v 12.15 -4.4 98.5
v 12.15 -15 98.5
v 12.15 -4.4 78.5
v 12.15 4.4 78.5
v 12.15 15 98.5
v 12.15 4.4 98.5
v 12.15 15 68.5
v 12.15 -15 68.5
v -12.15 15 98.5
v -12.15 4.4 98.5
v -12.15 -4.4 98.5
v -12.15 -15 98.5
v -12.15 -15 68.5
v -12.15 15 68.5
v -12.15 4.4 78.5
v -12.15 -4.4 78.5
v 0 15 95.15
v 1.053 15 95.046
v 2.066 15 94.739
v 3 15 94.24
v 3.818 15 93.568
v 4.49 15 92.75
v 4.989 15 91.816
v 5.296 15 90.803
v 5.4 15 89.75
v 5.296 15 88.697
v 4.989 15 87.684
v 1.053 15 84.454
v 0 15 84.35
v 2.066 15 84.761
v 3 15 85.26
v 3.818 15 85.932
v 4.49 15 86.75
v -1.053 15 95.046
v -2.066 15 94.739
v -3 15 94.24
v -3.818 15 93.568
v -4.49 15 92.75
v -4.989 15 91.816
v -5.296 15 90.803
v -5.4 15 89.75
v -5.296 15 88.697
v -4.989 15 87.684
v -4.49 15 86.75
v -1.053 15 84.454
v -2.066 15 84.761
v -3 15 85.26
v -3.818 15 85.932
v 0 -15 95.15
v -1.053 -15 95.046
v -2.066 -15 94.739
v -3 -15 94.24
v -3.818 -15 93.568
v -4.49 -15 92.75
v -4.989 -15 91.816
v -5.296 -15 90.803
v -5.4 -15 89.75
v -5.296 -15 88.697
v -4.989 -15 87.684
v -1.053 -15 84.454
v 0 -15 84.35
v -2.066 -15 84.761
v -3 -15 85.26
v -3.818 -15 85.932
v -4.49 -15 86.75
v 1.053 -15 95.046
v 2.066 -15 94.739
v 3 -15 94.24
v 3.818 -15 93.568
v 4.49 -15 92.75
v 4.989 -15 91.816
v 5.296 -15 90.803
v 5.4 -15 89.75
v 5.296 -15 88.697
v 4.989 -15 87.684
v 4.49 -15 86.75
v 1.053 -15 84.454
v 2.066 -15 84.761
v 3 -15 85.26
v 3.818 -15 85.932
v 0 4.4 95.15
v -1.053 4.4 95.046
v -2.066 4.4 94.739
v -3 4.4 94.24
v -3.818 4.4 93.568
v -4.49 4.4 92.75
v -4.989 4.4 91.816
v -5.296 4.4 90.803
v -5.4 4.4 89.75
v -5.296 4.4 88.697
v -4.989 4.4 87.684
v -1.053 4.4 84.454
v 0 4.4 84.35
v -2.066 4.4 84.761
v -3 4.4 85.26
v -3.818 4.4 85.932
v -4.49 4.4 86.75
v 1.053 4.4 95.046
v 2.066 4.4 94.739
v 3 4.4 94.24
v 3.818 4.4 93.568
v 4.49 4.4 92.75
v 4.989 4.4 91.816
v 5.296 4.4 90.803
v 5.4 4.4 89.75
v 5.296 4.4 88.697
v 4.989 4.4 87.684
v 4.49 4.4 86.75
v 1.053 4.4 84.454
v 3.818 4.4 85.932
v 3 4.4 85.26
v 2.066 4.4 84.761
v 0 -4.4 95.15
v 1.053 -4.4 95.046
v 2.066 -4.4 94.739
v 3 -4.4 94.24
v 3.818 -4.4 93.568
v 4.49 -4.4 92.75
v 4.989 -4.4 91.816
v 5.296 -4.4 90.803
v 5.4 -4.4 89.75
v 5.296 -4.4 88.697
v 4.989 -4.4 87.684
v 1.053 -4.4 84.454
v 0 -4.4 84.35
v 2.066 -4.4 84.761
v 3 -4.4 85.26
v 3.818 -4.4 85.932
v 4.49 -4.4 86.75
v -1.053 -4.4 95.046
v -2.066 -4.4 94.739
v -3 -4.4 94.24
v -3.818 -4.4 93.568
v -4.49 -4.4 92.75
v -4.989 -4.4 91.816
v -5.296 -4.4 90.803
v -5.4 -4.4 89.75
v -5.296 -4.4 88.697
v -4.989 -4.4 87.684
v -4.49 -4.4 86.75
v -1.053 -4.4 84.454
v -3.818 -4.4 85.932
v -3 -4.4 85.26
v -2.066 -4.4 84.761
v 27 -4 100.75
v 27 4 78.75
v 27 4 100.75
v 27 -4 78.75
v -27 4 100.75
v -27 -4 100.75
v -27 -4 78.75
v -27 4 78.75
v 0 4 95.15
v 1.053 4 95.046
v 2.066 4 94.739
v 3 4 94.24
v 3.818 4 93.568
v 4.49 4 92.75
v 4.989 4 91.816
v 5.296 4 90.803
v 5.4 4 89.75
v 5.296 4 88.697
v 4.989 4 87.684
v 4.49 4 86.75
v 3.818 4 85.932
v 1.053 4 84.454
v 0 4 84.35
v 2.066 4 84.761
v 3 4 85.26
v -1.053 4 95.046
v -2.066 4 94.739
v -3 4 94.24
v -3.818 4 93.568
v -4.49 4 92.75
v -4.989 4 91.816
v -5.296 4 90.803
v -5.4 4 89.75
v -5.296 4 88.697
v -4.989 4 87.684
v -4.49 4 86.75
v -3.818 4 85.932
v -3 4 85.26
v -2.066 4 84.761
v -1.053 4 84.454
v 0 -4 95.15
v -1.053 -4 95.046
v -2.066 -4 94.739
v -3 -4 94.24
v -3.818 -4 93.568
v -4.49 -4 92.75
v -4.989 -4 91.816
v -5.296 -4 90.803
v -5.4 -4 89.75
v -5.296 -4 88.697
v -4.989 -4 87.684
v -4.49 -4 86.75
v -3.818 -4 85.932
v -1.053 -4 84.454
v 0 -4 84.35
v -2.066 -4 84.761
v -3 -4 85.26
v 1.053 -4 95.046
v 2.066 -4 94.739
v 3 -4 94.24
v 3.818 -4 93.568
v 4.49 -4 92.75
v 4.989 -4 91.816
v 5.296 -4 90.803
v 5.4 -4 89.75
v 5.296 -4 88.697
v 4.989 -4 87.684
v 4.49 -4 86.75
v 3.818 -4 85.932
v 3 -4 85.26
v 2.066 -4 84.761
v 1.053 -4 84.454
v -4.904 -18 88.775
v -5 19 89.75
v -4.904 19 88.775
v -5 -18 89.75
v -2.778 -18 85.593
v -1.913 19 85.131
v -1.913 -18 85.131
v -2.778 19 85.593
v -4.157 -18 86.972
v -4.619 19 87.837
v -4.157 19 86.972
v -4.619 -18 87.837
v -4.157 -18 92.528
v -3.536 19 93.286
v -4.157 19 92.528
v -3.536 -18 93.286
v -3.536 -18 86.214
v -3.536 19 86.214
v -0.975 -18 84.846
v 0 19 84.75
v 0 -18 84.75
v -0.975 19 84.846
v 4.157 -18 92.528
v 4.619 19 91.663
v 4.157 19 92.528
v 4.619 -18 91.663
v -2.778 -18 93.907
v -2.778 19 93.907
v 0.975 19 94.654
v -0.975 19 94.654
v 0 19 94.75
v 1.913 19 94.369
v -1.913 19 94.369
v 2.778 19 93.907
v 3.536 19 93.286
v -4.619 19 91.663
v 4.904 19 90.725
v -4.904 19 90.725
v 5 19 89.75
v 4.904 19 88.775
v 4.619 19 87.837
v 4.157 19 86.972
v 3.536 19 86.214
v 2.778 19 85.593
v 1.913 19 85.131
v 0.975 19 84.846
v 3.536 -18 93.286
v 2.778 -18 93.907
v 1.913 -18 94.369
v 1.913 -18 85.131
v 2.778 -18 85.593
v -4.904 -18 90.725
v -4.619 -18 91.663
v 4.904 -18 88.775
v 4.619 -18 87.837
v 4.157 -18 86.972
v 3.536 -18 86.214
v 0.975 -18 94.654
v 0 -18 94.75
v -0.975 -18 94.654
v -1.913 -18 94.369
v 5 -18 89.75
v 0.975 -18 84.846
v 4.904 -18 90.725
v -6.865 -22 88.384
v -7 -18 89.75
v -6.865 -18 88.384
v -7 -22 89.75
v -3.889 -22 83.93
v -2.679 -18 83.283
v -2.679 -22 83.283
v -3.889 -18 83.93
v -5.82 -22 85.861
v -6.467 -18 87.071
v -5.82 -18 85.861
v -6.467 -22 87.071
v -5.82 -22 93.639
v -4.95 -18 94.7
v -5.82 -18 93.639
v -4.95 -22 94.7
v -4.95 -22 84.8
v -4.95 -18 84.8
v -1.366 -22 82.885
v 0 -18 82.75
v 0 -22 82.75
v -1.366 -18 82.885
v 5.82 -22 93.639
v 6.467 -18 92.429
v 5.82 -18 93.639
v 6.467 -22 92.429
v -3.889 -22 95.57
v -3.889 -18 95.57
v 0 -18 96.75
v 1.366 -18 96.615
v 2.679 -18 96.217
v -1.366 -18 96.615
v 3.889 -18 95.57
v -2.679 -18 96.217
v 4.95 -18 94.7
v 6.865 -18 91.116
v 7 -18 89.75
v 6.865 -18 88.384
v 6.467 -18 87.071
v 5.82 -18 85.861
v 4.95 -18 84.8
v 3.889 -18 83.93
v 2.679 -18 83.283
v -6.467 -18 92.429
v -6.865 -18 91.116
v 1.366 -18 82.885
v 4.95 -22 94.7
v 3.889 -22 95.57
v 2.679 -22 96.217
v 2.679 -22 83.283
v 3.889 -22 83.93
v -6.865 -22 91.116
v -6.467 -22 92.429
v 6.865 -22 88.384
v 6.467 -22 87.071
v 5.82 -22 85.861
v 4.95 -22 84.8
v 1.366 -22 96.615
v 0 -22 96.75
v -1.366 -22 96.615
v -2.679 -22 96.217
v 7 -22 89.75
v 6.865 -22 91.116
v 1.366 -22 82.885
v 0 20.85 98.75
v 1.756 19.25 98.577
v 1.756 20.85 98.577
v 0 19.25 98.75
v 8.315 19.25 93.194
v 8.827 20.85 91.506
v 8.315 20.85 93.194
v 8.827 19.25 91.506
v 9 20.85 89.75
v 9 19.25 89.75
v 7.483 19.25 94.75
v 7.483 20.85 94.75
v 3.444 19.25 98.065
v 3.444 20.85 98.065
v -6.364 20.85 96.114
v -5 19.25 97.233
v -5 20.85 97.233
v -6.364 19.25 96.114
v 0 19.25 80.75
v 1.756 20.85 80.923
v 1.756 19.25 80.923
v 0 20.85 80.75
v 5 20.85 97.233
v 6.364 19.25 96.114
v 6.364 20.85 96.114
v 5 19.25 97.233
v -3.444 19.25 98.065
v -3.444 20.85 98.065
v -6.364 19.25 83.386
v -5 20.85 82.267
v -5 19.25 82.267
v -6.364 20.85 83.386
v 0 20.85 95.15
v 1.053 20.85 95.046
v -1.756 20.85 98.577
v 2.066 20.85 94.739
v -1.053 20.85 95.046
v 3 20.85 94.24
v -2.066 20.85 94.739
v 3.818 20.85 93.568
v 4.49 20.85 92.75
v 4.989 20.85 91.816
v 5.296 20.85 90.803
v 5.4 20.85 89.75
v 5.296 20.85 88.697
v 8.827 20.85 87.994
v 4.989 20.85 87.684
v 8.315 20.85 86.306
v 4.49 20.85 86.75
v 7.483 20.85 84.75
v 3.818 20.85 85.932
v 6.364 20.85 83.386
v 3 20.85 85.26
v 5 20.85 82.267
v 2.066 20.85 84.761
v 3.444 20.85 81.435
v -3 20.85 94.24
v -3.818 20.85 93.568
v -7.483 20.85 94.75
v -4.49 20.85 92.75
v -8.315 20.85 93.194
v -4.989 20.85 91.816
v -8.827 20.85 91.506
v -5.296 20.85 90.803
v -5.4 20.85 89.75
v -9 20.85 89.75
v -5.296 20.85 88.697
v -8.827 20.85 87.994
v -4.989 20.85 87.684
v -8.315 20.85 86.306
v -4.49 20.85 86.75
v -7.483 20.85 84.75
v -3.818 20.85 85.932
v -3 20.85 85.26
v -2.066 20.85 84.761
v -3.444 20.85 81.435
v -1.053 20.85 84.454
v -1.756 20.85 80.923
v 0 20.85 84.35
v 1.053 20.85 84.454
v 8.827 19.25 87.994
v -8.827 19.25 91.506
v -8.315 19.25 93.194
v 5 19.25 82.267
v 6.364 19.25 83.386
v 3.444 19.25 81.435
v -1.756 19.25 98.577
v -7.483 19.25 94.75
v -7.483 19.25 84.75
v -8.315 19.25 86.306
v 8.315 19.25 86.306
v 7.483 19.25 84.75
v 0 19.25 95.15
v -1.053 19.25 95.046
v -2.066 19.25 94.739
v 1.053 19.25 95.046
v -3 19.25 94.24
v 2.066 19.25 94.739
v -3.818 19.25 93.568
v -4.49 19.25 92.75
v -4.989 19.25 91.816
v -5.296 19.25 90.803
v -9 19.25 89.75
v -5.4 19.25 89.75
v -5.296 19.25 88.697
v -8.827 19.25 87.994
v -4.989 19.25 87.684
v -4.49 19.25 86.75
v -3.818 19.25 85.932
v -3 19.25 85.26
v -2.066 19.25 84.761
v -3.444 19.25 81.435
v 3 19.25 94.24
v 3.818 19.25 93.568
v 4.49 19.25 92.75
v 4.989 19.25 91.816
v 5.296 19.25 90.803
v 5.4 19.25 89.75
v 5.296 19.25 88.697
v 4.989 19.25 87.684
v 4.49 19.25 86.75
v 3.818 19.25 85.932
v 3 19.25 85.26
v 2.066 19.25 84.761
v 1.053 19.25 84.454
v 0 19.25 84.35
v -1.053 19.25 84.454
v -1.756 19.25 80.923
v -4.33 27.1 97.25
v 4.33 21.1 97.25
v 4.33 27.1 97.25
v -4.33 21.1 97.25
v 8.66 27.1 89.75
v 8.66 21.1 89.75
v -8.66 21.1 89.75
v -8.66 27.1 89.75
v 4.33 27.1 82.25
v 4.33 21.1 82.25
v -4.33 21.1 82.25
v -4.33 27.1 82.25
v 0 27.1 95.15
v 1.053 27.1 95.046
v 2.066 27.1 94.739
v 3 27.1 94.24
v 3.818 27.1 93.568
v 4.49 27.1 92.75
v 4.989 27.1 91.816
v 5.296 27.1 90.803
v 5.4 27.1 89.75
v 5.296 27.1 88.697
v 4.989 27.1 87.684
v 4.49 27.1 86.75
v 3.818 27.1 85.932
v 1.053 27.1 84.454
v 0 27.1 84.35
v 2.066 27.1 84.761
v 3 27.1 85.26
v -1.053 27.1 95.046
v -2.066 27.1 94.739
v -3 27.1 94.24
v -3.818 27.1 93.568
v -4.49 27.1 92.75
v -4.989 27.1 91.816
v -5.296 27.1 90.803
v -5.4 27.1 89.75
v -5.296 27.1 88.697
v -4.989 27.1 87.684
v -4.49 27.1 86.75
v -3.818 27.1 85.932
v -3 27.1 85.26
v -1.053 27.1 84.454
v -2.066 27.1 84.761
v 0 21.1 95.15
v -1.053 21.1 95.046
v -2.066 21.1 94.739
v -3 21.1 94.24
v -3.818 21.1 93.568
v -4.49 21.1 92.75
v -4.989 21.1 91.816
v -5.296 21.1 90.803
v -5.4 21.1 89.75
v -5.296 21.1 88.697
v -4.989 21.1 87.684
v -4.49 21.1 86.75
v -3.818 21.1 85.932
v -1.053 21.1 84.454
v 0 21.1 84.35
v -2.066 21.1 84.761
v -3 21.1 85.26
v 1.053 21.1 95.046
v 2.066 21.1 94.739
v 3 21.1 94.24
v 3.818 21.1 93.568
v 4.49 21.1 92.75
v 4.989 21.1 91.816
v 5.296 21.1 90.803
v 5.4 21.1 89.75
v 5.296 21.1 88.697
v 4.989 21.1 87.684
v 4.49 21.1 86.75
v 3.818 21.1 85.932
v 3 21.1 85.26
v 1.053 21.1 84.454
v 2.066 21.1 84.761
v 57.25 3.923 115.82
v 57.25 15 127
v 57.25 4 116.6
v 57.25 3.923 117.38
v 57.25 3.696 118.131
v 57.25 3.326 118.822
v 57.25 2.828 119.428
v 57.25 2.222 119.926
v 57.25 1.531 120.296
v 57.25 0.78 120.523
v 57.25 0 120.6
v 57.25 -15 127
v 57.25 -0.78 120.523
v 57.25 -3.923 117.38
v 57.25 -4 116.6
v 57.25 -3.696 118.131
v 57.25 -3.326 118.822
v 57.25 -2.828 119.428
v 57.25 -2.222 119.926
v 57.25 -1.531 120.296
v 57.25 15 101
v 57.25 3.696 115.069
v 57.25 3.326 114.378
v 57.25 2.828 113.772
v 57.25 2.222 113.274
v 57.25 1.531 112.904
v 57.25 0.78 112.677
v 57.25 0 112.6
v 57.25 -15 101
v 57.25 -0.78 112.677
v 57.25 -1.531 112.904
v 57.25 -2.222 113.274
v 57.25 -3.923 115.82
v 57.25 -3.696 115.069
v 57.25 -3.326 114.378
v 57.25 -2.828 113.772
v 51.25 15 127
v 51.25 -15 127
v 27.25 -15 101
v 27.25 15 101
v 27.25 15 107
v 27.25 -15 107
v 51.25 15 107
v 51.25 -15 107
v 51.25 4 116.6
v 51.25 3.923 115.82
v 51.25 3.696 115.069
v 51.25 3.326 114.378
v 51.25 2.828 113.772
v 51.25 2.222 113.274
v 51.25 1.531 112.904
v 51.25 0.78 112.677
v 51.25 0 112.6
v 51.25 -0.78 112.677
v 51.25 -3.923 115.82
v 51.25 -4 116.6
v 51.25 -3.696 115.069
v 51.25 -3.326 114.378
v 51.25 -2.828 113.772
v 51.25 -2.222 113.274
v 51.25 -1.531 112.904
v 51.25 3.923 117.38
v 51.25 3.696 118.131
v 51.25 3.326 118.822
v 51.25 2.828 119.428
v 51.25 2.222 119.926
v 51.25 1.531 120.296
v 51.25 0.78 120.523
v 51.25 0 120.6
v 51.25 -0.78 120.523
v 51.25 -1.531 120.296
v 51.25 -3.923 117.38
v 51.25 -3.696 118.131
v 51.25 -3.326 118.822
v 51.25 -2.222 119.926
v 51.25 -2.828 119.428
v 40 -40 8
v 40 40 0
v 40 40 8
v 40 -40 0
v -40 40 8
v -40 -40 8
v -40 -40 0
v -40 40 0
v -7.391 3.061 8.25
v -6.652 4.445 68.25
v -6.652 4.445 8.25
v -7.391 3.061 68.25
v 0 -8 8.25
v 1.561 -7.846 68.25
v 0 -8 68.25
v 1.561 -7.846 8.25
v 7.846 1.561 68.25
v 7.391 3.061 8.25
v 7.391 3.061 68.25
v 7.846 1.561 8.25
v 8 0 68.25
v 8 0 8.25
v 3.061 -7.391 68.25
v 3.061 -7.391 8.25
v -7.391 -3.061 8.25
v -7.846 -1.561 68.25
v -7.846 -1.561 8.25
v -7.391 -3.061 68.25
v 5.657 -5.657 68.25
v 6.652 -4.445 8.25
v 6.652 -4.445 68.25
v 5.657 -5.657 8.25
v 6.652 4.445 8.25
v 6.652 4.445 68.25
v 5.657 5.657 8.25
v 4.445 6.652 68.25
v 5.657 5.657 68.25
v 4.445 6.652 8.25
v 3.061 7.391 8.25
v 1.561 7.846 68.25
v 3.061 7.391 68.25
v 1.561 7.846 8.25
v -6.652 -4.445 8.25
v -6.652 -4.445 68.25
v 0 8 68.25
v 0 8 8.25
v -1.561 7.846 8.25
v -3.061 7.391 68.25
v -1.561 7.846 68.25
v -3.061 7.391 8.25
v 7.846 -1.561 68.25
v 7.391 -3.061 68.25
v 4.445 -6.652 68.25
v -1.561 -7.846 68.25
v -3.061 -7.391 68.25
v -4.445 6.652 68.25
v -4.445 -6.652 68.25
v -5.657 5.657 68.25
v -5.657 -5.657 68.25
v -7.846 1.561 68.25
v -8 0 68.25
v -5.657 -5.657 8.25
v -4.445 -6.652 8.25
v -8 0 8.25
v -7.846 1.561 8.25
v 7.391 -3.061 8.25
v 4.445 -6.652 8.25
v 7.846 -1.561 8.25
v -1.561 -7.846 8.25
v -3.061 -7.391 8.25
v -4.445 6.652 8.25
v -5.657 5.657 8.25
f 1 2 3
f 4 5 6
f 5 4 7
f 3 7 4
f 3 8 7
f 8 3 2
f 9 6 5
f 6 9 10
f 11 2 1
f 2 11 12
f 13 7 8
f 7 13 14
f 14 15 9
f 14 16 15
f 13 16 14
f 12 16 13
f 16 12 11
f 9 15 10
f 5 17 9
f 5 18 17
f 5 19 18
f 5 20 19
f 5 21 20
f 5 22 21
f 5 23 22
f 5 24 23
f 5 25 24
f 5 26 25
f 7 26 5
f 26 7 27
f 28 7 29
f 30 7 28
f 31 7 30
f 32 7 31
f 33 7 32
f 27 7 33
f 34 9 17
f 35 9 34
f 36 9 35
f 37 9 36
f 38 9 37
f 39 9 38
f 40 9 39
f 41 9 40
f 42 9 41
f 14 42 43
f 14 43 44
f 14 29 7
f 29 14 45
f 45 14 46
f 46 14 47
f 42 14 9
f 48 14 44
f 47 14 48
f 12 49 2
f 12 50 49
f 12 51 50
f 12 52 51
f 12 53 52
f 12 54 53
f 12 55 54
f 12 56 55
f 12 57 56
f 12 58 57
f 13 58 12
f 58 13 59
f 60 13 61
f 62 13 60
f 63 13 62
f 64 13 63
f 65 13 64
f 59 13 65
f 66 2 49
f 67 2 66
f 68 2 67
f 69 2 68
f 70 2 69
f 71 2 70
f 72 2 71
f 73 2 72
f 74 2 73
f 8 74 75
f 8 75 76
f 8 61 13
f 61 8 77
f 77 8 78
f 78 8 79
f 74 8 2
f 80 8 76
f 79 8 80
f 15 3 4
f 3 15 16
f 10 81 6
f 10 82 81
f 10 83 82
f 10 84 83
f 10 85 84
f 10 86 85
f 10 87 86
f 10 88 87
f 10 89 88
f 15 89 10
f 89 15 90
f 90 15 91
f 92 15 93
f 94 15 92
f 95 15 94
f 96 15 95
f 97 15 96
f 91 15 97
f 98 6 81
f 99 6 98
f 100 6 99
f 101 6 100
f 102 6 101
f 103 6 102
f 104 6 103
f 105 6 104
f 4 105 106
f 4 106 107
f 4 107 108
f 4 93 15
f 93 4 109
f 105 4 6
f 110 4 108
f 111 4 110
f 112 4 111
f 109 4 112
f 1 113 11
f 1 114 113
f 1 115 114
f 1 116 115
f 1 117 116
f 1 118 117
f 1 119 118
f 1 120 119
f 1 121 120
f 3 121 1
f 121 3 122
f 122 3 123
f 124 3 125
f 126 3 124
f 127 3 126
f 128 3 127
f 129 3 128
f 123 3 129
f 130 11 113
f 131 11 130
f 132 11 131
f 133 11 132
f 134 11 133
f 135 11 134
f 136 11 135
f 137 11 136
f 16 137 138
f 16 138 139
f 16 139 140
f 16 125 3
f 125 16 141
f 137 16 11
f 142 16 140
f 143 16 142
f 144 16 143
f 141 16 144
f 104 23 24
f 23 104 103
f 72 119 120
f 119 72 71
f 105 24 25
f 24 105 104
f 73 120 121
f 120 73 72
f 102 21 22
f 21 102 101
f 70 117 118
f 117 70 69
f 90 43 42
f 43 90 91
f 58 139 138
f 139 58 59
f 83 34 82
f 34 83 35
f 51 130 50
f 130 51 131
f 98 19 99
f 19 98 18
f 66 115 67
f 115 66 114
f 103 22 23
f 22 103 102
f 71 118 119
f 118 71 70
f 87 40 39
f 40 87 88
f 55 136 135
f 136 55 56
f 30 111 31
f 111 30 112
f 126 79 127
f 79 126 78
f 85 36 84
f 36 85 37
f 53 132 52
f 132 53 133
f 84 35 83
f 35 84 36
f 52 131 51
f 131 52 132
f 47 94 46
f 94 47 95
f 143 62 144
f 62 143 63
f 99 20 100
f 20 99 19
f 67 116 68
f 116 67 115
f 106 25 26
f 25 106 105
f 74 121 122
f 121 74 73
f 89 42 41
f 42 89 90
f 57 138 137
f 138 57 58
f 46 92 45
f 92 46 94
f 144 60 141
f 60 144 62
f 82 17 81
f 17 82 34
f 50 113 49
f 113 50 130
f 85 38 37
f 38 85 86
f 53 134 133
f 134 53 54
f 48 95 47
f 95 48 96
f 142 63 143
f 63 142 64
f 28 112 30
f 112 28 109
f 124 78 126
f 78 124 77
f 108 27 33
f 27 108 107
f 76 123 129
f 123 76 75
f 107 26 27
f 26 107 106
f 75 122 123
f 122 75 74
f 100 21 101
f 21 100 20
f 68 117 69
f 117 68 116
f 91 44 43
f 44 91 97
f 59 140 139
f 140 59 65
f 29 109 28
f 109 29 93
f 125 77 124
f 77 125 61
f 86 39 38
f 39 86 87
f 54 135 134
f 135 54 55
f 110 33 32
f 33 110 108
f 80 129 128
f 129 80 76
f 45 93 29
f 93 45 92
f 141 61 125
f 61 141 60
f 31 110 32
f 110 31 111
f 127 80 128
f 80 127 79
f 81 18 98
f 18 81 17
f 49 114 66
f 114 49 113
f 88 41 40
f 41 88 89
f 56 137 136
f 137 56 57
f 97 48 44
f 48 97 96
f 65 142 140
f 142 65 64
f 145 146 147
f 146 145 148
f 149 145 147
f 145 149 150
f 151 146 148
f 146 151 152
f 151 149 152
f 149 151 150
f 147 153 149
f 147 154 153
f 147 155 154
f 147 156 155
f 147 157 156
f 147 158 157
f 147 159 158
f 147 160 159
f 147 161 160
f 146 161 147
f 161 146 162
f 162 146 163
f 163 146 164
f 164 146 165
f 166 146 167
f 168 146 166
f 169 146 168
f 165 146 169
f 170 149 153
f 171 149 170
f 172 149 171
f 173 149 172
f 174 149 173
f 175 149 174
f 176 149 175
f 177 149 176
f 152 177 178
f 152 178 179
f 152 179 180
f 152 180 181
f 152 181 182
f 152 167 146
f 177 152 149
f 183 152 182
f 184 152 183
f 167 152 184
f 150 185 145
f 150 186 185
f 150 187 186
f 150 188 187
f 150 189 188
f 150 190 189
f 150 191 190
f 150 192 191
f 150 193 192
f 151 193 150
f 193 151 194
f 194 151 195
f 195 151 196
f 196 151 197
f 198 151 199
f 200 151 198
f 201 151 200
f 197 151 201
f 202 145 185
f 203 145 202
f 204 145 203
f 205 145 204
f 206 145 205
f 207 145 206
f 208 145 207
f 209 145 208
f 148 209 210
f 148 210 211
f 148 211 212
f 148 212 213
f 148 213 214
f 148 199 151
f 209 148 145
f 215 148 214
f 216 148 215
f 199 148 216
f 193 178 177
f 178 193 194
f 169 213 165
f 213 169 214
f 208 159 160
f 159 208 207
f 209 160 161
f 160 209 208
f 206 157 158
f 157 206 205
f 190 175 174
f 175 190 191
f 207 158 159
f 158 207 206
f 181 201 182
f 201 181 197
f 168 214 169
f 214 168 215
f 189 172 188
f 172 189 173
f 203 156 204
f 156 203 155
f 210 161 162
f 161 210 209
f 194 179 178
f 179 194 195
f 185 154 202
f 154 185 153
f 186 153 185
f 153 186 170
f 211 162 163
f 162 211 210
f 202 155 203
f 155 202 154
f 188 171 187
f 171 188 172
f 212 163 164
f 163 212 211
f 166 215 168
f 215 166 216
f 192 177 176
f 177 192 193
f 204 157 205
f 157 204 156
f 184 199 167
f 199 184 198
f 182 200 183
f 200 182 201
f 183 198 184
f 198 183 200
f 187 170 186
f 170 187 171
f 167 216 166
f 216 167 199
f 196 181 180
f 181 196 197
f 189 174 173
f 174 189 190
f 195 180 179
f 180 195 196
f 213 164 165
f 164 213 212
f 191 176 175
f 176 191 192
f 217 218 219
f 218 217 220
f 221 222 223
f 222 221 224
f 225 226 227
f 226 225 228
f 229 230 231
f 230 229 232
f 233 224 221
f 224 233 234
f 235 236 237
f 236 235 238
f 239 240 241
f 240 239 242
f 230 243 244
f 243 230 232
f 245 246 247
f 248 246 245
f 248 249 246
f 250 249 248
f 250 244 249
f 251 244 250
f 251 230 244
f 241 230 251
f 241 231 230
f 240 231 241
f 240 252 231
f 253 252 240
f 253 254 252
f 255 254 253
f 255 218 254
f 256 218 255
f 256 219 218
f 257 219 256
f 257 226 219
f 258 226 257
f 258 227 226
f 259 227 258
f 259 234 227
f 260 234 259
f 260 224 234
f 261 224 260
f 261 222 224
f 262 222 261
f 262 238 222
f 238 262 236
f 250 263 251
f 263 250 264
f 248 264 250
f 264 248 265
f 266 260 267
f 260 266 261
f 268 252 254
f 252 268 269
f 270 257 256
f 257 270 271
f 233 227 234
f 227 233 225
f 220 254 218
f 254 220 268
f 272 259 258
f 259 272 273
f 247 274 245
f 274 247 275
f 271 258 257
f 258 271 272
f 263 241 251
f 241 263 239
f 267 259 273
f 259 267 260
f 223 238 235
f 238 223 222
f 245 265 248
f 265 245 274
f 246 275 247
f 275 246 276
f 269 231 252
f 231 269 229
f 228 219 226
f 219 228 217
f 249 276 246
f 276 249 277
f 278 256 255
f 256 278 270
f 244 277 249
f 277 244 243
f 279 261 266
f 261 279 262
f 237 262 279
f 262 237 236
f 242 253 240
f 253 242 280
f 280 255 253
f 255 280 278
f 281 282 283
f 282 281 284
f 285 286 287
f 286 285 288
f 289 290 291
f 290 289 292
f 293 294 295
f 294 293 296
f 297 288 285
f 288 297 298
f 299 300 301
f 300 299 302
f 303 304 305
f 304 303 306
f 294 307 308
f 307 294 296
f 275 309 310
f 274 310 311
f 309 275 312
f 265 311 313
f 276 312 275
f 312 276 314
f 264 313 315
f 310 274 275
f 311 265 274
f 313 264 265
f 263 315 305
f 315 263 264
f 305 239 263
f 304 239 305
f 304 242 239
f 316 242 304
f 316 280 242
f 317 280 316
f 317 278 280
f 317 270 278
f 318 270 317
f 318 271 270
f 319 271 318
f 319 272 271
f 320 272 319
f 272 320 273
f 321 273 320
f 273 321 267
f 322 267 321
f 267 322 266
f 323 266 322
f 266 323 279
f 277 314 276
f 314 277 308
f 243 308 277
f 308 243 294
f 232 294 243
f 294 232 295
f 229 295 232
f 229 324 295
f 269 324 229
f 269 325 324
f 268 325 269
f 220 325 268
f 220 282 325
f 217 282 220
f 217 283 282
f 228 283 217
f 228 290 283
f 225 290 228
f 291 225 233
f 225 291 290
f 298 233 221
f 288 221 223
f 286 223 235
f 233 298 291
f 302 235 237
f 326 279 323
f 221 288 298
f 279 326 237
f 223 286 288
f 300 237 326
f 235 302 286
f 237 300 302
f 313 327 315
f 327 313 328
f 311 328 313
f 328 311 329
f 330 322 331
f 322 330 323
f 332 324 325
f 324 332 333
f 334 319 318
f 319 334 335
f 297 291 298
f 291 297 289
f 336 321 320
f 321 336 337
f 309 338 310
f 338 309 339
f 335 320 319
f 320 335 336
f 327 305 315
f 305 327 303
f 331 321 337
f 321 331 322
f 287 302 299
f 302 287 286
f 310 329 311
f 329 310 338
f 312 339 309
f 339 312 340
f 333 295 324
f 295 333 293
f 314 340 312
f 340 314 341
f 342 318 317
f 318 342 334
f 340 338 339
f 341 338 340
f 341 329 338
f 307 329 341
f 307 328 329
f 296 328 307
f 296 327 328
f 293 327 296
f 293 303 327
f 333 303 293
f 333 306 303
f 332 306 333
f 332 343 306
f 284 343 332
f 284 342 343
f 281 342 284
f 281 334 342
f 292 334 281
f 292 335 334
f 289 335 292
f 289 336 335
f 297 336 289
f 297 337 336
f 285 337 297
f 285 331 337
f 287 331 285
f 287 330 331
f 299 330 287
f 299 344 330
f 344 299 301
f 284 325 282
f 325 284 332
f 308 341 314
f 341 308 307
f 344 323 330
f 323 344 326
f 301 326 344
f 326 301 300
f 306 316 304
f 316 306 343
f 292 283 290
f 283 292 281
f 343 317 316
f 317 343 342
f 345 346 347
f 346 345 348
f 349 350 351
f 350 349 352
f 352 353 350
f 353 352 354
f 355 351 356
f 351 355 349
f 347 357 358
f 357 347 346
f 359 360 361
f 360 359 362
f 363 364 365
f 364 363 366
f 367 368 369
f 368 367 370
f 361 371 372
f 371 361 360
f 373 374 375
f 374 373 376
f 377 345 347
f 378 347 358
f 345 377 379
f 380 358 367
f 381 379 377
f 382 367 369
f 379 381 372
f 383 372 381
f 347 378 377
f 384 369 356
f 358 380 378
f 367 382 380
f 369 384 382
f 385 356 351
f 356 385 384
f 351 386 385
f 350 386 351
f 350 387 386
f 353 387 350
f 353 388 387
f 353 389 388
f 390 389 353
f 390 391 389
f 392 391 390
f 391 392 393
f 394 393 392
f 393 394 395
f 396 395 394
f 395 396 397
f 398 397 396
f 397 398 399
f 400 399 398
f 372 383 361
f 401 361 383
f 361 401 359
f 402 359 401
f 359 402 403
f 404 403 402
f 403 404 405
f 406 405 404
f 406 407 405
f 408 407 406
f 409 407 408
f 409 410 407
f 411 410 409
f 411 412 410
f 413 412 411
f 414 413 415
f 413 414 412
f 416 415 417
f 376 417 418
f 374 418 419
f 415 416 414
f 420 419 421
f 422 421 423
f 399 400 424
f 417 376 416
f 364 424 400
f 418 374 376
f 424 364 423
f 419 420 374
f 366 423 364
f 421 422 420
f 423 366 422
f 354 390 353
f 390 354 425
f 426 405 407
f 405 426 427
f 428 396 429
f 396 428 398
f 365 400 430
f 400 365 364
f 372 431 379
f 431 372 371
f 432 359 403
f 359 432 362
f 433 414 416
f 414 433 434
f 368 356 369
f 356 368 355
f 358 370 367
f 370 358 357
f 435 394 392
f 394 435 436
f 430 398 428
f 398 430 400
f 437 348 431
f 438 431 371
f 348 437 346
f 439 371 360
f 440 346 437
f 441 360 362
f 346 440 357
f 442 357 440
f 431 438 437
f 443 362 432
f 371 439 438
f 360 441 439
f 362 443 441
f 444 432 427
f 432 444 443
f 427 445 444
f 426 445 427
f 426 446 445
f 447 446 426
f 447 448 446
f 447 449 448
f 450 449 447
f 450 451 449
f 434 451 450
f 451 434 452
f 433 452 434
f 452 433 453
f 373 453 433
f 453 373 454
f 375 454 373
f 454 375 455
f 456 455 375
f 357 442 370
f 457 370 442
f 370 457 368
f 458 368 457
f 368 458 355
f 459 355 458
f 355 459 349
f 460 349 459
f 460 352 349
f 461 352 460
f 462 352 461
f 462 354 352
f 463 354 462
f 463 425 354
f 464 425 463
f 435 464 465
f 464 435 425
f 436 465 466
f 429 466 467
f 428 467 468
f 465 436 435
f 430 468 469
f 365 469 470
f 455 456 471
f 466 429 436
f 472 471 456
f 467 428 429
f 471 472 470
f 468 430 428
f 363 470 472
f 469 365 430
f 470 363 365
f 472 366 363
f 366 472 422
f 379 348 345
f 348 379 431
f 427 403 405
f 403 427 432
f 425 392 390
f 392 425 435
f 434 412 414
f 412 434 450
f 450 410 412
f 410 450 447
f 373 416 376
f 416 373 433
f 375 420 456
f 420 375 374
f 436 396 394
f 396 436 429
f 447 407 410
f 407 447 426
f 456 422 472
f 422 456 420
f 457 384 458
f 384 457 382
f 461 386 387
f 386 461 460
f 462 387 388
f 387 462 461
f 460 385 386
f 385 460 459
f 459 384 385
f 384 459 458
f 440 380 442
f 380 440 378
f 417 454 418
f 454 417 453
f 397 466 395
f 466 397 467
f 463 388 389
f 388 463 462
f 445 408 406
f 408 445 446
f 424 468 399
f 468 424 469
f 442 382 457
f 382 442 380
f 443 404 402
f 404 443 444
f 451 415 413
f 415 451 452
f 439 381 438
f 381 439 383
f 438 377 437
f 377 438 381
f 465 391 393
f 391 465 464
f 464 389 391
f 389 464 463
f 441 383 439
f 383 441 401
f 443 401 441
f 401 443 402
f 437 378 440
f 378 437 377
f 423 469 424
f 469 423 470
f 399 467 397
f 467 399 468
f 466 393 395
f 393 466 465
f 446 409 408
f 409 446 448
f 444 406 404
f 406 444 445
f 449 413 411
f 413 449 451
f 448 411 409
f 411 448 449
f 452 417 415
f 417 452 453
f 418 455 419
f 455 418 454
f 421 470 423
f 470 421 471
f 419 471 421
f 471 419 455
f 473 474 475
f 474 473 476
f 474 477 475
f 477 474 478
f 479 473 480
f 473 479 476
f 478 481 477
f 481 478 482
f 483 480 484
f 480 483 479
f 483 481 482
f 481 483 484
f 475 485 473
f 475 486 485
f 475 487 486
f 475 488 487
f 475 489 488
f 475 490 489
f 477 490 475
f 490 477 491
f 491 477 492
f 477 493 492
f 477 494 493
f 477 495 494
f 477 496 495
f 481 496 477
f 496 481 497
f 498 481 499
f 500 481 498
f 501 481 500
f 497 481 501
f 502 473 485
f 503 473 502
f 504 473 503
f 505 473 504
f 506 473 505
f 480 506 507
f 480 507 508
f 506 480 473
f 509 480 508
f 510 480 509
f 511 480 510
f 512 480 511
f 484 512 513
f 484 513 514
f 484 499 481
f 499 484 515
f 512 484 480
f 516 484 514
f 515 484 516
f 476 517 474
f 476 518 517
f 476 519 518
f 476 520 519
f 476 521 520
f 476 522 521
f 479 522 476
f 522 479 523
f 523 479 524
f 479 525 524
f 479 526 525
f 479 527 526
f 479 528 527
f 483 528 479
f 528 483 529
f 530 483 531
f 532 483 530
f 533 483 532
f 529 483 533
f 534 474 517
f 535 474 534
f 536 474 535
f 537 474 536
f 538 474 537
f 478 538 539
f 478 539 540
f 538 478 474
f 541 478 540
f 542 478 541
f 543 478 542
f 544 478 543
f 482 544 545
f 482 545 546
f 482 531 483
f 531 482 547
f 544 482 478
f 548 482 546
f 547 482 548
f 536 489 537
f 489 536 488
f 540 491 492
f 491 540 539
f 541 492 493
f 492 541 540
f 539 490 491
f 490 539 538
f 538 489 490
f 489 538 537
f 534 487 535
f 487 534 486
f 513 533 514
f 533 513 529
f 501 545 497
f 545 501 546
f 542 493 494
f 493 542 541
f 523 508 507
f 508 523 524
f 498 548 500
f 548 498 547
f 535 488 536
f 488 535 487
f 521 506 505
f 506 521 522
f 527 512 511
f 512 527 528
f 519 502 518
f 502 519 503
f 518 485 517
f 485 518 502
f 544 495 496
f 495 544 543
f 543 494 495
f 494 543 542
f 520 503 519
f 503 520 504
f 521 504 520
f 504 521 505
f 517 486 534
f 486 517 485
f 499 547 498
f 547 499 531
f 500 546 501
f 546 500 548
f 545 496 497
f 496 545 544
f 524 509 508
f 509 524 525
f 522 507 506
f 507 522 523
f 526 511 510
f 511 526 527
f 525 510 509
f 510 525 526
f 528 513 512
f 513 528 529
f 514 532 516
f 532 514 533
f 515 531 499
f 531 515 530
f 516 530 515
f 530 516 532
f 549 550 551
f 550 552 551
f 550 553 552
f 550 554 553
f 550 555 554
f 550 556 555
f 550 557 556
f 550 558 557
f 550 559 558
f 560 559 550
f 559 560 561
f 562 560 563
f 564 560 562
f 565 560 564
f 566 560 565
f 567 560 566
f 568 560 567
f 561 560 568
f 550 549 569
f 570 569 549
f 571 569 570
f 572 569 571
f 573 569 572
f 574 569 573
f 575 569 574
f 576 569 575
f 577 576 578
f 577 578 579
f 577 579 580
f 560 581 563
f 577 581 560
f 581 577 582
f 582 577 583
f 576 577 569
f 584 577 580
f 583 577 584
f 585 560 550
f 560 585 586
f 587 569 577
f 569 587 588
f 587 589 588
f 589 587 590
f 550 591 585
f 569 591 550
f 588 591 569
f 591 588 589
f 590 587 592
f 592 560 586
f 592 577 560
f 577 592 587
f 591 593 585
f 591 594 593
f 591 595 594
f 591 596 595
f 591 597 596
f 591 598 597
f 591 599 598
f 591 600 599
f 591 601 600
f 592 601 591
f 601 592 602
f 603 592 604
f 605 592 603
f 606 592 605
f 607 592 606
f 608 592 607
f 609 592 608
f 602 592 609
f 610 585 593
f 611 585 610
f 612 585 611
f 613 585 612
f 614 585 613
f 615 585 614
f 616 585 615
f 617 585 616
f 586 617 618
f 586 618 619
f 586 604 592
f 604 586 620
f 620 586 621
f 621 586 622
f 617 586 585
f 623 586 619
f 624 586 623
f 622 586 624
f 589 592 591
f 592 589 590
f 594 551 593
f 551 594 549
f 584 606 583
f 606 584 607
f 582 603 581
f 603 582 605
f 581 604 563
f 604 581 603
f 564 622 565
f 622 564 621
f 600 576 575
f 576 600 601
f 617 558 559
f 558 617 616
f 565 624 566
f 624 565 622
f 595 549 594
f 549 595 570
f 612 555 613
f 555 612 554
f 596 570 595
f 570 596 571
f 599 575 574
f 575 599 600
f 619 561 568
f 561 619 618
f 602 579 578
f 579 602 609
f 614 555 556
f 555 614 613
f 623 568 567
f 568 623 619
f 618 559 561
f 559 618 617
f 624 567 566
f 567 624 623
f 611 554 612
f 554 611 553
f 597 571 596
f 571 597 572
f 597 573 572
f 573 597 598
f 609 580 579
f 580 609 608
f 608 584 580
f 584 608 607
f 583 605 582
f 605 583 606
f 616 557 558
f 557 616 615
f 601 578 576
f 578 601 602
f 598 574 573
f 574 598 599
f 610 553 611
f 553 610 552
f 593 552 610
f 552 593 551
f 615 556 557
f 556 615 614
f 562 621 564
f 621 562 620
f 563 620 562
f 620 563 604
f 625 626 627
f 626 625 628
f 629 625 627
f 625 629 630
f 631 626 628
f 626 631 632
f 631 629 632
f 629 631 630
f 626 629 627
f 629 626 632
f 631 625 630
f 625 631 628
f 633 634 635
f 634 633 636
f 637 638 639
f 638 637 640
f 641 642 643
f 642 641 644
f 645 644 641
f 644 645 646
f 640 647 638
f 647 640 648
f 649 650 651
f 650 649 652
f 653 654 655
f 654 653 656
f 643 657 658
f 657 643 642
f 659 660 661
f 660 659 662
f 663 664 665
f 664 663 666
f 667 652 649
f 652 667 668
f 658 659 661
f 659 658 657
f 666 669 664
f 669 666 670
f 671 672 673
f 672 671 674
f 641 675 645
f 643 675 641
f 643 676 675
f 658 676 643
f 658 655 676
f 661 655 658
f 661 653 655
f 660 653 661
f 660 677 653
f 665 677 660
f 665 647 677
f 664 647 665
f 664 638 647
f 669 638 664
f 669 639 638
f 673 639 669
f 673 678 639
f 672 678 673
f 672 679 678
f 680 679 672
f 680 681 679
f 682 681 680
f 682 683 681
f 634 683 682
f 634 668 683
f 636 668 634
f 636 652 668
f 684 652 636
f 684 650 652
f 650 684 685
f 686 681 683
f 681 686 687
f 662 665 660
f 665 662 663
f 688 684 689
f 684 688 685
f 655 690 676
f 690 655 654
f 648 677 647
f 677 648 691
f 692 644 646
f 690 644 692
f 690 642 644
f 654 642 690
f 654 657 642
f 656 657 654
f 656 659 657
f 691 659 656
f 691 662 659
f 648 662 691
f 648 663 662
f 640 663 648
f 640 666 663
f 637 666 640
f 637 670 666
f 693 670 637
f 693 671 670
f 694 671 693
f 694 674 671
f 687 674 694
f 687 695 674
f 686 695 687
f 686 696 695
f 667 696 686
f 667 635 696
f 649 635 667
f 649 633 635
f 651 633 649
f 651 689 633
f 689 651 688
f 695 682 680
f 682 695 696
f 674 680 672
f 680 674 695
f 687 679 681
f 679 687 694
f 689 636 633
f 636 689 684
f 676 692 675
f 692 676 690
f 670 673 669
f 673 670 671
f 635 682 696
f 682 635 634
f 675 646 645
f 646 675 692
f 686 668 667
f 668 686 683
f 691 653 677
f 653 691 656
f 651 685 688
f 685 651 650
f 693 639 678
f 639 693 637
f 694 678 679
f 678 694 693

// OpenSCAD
$fn = 32;

// ------------------------------------------------------------------------
// Lamp arm: column d16 x 60 mm, arm 54 mm
// Every part is its own module, assembly() places every instance.
// ------------------------------------------------------------------------

// --- part 1 ---
module lamp_base() {
  difference() {
    translate([-40, -40, 0]) cube([80, 80, 8]);
  }
}

// --- part 2 ---
module lamp_column() {
  cylinder(h = 60, d = 16);
}

// --- part 3 ---
module head_fork() {
  difference() {
    translate([-12.15, -15, 0]) cube([24.3, 30, 30]);
    translate([-13.15, -4.4, 10]) cube([26.3, 8.8, 21]);
    translate([0, 0, 21.25]) rotate([90, 0, 0]) cylinder(h = 32, d = 10.8, center = true);
  }
}

// --- part 4 ---
module lamp_arm() {
  difference() {
    translate([-27, -4, 0]) cube([54, 8, 22]);
    translate([0, 0, 11]) rotate([90, 0, 0]) cylinder(h = 10, d = 10.8, center = true);
  }
}

// --- part 5 ---
module arm_pin() {
  rotate([0, 90, 0]) cylinder(h = 38, d = 10, center = true);
  translate([-22, 0, 0]) rotate([0, 90, 0]) cylinder(h = 4, d = 14);
}

// --- part 6 ---
module arm_washer() {
  difference() {
      translate([0, 0, 0]) cylinder(h = 1.6, d = 18);
      translate([0, 0, -1]) cylinder(h = 3.6, d = 10.8);
    }
}

// --- part 7 ---
module arm_nut() {
  difference() {
    linear_extrude(height = 6) polygon(points = [[8.66, 0], [4.33, 7.5], [-4.33, 7.5], [-8.66, 0], [-4.33, -7.5], [4.33, -7.5]]);
    translate([0, 0, -1]) cylinder(h = 8, d = 10.8);
  }
}

// --- part 8 ---
module shade_bracket() {
  difference() {
    translate([-15, -15, 0]) cube([30, 30, 26]);
    translate([-16, -16, 6]) cube([25, 32, 21]);
    translate([12, 0, 15.6]) rotate([0, 90, 0]) cylinder(h = 8, d = 8, center = true);
  }
}

// --- assembly ---
module assembly() {
  color([0.80, 0.24, 0.20]) translate([0, 0, 0]) rotate([0, 0, 0]) lamp_base();
  color([0.20, 0.45, 0.75]) translate([0, 0, 8.25]) rotate([0, 0, 0]) lamp_column();
  color([0.25, 0.62, 0.32]) translate([0, 0, 68.5]) rotate([0, 0, 0]) head_fork();
  color([0.92, 0.70, 0.18]) translate([0, 0, 78.75]) rotate([0, 0, 0]) lamp_arm();
  color([0.58, 0.35, 0.70]) translate([0, 0, 89.75]) rotate([0, 0, 90]) arm_pin();
  color([0.16, 0.66, 0.66]) translate([0, 20.85, 89.75]) rotate([90, 0, 0]) arm_washer();
  color([0.85, 0.48, 0.18]) translate([0, 27.1, 89.75]) rotate([90, 0, 0]) arm_nut();
  color([0.55, 0.60, 0.65]) translate([42.25, 0, 101]) rotate([0, 0, 0]) shade_bracket();
}

assembly();
